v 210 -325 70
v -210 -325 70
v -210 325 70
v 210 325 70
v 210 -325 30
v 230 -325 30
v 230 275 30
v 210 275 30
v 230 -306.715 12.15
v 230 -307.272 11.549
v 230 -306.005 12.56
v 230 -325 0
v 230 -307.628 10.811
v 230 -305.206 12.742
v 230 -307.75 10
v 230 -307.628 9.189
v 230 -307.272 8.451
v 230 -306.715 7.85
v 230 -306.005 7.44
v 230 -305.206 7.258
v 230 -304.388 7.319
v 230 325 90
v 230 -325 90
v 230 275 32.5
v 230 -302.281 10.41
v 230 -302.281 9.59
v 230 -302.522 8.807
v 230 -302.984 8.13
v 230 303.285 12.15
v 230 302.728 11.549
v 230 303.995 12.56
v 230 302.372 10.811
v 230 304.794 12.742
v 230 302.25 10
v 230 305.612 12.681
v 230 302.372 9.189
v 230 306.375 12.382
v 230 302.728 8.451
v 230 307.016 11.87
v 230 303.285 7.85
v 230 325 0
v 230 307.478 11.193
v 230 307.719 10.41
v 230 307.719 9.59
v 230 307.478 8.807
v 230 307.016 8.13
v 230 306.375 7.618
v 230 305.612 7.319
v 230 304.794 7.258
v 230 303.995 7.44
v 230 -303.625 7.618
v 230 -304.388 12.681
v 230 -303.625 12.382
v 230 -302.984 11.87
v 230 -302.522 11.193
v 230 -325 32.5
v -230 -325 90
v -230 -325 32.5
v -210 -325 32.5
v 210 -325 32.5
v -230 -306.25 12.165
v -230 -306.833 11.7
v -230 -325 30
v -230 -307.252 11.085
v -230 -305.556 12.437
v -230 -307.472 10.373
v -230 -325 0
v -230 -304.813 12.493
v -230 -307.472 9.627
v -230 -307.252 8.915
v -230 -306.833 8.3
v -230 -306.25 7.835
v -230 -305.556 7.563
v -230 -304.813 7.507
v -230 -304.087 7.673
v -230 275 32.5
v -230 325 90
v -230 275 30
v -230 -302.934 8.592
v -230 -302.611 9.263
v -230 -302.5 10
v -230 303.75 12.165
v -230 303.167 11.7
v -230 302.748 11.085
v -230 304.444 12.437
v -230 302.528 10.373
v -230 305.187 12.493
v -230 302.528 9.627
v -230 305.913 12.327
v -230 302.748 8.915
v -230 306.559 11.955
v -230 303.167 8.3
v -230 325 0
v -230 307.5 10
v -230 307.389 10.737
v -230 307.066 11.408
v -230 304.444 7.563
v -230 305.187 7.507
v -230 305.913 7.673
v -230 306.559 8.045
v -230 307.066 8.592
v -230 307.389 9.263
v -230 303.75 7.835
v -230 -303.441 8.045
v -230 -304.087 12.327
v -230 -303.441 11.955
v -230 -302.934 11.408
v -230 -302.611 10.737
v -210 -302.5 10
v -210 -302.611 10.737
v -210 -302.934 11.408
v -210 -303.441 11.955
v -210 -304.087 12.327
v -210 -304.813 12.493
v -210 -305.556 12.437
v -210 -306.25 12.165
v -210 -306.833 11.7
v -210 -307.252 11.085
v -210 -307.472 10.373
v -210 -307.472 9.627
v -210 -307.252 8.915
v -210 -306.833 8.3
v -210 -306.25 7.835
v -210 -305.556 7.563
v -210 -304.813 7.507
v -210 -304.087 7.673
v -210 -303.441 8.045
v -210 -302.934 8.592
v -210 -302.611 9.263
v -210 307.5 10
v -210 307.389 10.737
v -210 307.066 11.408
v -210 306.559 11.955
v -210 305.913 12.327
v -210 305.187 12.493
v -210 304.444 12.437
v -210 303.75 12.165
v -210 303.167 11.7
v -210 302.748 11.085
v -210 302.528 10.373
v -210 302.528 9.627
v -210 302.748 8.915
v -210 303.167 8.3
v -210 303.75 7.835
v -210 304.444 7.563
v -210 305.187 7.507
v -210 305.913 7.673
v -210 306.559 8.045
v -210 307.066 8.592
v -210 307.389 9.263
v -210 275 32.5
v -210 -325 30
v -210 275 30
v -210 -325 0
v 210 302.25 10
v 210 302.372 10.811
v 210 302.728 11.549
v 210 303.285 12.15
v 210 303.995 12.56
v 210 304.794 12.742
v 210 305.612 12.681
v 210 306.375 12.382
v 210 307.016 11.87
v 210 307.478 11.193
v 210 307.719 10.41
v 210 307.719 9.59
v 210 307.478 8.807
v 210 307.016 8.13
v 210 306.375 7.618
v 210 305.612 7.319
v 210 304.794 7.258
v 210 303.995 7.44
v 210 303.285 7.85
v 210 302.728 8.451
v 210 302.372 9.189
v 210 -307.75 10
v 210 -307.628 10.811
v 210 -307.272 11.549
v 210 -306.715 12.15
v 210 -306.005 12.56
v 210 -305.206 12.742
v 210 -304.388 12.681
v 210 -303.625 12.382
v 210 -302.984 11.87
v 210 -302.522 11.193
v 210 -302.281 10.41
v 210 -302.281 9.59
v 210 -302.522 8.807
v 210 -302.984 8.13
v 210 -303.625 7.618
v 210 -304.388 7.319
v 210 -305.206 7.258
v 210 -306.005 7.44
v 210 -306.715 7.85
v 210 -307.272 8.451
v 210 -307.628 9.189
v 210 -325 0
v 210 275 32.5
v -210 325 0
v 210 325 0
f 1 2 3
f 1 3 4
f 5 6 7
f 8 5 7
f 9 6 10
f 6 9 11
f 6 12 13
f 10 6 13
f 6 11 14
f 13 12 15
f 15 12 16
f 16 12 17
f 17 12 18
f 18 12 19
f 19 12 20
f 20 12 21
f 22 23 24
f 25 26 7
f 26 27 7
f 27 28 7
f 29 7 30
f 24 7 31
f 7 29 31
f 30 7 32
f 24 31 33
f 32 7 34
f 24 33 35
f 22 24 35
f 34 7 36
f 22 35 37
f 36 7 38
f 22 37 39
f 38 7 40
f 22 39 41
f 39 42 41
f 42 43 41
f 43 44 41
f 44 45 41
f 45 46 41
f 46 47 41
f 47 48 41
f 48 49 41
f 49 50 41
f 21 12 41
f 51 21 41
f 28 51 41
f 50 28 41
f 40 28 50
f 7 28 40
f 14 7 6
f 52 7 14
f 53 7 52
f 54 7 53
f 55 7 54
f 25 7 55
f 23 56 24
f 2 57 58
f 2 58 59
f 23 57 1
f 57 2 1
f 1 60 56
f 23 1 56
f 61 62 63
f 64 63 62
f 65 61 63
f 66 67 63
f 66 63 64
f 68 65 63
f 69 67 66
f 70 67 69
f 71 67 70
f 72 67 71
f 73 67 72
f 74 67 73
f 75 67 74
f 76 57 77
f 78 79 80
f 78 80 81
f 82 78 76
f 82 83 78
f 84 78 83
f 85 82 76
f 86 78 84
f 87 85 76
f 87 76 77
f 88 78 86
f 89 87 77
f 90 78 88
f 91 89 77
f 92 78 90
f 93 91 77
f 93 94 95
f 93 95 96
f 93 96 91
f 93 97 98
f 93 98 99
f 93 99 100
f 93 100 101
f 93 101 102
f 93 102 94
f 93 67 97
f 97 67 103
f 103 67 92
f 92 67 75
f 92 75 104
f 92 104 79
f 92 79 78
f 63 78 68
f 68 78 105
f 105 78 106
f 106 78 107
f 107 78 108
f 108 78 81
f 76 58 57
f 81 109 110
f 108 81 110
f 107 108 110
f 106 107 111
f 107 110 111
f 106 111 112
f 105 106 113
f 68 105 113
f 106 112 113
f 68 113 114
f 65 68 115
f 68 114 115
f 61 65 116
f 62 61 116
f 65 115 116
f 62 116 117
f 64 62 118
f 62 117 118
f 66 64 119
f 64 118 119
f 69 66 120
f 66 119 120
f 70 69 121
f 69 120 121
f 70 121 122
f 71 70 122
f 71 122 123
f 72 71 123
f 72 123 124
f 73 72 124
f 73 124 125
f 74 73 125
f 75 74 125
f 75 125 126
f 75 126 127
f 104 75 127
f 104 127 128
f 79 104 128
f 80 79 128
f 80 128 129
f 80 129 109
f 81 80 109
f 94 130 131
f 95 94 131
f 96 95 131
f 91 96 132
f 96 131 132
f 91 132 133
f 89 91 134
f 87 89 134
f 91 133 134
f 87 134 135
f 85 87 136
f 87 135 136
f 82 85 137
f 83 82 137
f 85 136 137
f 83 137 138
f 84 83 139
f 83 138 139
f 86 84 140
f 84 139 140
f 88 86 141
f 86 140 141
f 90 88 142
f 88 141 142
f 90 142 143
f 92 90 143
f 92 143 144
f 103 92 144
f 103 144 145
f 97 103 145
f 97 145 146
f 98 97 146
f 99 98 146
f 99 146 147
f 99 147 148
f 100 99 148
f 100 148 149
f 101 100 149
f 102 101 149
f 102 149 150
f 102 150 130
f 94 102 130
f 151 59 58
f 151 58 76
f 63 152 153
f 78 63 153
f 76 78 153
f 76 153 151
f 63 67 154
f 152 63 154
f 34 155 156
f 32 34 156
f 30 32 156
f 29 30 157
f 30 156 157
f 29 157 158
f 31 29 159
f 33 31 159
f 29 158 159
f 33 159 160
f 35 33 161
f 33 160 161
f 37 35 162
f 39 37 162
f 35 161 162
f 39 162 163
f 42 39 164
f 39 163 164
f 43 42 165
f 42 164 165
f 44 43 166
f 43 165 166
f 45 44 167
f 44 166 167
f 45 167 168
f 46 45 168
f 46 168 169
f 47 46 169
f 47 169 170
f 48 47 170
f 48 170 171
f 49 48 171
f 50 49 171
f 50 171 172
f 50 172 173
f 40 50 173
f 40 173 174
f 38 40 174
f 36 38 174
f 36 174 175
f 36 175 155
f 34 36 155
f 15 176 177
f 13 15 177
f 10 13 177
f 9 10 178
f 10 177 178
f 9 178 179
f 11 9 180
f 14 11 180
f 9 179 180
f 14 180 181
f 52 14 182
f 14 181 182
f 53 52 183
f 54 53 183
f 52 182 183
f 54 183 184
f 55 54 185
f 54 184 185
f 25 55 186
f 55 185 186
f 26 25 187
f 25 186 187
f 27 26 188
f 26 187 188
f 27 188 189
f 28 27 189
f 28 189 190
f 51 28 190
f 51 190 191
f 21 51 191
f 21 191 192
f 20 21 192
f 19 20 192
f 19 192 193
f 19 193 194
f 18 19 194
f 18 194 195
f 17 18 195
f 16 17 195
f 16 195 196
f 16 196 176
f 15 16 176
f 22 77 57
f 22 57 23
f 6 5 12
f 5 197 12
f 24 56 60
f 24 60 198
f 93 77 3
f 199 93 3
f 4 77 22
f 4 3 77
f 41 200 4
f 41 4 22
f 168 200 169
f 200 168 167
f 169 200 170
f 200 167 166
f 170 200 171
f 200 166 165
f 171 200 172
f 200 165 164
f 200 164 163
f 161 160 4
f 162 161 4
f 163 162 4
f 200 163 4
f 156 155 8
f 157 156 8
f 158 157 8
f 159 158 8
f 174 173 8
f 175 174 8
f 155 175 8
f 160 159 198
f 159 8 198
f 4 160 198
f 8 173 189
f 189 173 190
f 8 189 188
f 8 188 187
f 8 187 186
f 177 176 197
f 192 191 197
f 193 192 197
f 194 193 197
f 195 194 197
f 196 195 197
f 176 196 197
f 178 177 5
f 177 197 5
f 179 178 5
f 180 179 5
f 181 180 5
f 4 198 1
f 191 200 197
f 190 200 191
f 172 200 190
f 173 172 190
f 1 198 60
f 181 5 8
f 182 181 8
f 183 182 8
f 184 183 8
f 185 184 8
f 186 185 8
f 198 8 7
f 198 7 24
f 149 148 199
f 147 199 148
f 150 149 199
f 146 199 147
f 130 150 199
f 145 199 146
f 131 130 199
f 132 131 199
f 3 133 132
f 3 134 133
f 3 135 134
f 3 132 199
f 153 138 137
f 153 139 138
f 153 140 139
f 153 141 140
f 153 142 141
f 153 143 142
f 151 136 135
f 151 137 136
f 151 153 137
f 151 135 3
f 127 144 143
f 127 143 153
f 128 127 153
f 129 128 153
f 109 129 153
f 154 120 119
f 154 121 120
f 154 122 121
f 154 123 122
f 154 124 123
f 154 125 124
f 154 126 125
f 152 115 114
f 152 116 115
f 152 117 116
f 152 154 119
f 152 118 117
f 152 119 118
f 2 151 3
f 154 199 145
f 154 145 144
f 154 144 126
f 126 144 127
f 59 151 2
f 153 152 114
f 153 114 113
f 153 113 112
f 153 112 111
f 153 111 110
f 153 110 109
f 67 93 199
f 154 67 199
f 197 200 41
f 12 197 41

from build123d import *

# Parameters (mm, degrees)
F0_W     = 460
F0_H     = 650
F1_DEPTH = 90
F2_W     = 420
F2_H     = 70
F3_DEPTH = 650.001
F4_W     = 600
F4_H     = 2.5
F5_DEPTH = 460.001
F7_D     = 5
F7_DEPTH = 20.001
F9_D     = 5.5
F9_DEPTH = 20.001


with BuildPart() as f1:
    # F0 (on Top) → F1 (new body)
    with BuildSketch(Plane.XY):
        Rectangle(F0_W, F0_H)
    extrude(amount=F1_DEPTH)

    # F2 (on face) → F3 (cut, through all)
    with BuildSketch(Plane.XZ.offset(325)):
        with Locations((0, 35)):
            Rectangle(F2_W, F2_H)
    extrude(amount=-F3_DEPTH, mode=Mode.SUBTRACT)

    # F4 (on face) → F5 (cut, through all)
    with BuildSketch(Plane.YZ.offset(230)):
        with Locations((-25, 31.25)):
            Rectangle(F4_W, F4_H)
    extrude(amount=-F5_DEPTH, mode=Mode.SUBTRACT)

    # F7 (through all, one way)
    with BuildSketch(Plane.YZ.offset(-210)):
        with Locations((-305, 10), (305, 10)):
            Circle(F7_D / 2)
    extrude(amount=-F7_DEPTH, mode=Mode.SUBTRACT)

    # F9 (through all, one way)
    with BuildSketch(Plane(origin=(210, 0, 0), x_dir=(0, -1, 0), z_dir=(-1, 0, 0))):
        with Locations((305, 10), (-305, 10)):
            Circle(F9_D / 2)
    extrude(amount=-F9_DEPTH, mode=Mode.SUBTRACT)


solid = f1.part
